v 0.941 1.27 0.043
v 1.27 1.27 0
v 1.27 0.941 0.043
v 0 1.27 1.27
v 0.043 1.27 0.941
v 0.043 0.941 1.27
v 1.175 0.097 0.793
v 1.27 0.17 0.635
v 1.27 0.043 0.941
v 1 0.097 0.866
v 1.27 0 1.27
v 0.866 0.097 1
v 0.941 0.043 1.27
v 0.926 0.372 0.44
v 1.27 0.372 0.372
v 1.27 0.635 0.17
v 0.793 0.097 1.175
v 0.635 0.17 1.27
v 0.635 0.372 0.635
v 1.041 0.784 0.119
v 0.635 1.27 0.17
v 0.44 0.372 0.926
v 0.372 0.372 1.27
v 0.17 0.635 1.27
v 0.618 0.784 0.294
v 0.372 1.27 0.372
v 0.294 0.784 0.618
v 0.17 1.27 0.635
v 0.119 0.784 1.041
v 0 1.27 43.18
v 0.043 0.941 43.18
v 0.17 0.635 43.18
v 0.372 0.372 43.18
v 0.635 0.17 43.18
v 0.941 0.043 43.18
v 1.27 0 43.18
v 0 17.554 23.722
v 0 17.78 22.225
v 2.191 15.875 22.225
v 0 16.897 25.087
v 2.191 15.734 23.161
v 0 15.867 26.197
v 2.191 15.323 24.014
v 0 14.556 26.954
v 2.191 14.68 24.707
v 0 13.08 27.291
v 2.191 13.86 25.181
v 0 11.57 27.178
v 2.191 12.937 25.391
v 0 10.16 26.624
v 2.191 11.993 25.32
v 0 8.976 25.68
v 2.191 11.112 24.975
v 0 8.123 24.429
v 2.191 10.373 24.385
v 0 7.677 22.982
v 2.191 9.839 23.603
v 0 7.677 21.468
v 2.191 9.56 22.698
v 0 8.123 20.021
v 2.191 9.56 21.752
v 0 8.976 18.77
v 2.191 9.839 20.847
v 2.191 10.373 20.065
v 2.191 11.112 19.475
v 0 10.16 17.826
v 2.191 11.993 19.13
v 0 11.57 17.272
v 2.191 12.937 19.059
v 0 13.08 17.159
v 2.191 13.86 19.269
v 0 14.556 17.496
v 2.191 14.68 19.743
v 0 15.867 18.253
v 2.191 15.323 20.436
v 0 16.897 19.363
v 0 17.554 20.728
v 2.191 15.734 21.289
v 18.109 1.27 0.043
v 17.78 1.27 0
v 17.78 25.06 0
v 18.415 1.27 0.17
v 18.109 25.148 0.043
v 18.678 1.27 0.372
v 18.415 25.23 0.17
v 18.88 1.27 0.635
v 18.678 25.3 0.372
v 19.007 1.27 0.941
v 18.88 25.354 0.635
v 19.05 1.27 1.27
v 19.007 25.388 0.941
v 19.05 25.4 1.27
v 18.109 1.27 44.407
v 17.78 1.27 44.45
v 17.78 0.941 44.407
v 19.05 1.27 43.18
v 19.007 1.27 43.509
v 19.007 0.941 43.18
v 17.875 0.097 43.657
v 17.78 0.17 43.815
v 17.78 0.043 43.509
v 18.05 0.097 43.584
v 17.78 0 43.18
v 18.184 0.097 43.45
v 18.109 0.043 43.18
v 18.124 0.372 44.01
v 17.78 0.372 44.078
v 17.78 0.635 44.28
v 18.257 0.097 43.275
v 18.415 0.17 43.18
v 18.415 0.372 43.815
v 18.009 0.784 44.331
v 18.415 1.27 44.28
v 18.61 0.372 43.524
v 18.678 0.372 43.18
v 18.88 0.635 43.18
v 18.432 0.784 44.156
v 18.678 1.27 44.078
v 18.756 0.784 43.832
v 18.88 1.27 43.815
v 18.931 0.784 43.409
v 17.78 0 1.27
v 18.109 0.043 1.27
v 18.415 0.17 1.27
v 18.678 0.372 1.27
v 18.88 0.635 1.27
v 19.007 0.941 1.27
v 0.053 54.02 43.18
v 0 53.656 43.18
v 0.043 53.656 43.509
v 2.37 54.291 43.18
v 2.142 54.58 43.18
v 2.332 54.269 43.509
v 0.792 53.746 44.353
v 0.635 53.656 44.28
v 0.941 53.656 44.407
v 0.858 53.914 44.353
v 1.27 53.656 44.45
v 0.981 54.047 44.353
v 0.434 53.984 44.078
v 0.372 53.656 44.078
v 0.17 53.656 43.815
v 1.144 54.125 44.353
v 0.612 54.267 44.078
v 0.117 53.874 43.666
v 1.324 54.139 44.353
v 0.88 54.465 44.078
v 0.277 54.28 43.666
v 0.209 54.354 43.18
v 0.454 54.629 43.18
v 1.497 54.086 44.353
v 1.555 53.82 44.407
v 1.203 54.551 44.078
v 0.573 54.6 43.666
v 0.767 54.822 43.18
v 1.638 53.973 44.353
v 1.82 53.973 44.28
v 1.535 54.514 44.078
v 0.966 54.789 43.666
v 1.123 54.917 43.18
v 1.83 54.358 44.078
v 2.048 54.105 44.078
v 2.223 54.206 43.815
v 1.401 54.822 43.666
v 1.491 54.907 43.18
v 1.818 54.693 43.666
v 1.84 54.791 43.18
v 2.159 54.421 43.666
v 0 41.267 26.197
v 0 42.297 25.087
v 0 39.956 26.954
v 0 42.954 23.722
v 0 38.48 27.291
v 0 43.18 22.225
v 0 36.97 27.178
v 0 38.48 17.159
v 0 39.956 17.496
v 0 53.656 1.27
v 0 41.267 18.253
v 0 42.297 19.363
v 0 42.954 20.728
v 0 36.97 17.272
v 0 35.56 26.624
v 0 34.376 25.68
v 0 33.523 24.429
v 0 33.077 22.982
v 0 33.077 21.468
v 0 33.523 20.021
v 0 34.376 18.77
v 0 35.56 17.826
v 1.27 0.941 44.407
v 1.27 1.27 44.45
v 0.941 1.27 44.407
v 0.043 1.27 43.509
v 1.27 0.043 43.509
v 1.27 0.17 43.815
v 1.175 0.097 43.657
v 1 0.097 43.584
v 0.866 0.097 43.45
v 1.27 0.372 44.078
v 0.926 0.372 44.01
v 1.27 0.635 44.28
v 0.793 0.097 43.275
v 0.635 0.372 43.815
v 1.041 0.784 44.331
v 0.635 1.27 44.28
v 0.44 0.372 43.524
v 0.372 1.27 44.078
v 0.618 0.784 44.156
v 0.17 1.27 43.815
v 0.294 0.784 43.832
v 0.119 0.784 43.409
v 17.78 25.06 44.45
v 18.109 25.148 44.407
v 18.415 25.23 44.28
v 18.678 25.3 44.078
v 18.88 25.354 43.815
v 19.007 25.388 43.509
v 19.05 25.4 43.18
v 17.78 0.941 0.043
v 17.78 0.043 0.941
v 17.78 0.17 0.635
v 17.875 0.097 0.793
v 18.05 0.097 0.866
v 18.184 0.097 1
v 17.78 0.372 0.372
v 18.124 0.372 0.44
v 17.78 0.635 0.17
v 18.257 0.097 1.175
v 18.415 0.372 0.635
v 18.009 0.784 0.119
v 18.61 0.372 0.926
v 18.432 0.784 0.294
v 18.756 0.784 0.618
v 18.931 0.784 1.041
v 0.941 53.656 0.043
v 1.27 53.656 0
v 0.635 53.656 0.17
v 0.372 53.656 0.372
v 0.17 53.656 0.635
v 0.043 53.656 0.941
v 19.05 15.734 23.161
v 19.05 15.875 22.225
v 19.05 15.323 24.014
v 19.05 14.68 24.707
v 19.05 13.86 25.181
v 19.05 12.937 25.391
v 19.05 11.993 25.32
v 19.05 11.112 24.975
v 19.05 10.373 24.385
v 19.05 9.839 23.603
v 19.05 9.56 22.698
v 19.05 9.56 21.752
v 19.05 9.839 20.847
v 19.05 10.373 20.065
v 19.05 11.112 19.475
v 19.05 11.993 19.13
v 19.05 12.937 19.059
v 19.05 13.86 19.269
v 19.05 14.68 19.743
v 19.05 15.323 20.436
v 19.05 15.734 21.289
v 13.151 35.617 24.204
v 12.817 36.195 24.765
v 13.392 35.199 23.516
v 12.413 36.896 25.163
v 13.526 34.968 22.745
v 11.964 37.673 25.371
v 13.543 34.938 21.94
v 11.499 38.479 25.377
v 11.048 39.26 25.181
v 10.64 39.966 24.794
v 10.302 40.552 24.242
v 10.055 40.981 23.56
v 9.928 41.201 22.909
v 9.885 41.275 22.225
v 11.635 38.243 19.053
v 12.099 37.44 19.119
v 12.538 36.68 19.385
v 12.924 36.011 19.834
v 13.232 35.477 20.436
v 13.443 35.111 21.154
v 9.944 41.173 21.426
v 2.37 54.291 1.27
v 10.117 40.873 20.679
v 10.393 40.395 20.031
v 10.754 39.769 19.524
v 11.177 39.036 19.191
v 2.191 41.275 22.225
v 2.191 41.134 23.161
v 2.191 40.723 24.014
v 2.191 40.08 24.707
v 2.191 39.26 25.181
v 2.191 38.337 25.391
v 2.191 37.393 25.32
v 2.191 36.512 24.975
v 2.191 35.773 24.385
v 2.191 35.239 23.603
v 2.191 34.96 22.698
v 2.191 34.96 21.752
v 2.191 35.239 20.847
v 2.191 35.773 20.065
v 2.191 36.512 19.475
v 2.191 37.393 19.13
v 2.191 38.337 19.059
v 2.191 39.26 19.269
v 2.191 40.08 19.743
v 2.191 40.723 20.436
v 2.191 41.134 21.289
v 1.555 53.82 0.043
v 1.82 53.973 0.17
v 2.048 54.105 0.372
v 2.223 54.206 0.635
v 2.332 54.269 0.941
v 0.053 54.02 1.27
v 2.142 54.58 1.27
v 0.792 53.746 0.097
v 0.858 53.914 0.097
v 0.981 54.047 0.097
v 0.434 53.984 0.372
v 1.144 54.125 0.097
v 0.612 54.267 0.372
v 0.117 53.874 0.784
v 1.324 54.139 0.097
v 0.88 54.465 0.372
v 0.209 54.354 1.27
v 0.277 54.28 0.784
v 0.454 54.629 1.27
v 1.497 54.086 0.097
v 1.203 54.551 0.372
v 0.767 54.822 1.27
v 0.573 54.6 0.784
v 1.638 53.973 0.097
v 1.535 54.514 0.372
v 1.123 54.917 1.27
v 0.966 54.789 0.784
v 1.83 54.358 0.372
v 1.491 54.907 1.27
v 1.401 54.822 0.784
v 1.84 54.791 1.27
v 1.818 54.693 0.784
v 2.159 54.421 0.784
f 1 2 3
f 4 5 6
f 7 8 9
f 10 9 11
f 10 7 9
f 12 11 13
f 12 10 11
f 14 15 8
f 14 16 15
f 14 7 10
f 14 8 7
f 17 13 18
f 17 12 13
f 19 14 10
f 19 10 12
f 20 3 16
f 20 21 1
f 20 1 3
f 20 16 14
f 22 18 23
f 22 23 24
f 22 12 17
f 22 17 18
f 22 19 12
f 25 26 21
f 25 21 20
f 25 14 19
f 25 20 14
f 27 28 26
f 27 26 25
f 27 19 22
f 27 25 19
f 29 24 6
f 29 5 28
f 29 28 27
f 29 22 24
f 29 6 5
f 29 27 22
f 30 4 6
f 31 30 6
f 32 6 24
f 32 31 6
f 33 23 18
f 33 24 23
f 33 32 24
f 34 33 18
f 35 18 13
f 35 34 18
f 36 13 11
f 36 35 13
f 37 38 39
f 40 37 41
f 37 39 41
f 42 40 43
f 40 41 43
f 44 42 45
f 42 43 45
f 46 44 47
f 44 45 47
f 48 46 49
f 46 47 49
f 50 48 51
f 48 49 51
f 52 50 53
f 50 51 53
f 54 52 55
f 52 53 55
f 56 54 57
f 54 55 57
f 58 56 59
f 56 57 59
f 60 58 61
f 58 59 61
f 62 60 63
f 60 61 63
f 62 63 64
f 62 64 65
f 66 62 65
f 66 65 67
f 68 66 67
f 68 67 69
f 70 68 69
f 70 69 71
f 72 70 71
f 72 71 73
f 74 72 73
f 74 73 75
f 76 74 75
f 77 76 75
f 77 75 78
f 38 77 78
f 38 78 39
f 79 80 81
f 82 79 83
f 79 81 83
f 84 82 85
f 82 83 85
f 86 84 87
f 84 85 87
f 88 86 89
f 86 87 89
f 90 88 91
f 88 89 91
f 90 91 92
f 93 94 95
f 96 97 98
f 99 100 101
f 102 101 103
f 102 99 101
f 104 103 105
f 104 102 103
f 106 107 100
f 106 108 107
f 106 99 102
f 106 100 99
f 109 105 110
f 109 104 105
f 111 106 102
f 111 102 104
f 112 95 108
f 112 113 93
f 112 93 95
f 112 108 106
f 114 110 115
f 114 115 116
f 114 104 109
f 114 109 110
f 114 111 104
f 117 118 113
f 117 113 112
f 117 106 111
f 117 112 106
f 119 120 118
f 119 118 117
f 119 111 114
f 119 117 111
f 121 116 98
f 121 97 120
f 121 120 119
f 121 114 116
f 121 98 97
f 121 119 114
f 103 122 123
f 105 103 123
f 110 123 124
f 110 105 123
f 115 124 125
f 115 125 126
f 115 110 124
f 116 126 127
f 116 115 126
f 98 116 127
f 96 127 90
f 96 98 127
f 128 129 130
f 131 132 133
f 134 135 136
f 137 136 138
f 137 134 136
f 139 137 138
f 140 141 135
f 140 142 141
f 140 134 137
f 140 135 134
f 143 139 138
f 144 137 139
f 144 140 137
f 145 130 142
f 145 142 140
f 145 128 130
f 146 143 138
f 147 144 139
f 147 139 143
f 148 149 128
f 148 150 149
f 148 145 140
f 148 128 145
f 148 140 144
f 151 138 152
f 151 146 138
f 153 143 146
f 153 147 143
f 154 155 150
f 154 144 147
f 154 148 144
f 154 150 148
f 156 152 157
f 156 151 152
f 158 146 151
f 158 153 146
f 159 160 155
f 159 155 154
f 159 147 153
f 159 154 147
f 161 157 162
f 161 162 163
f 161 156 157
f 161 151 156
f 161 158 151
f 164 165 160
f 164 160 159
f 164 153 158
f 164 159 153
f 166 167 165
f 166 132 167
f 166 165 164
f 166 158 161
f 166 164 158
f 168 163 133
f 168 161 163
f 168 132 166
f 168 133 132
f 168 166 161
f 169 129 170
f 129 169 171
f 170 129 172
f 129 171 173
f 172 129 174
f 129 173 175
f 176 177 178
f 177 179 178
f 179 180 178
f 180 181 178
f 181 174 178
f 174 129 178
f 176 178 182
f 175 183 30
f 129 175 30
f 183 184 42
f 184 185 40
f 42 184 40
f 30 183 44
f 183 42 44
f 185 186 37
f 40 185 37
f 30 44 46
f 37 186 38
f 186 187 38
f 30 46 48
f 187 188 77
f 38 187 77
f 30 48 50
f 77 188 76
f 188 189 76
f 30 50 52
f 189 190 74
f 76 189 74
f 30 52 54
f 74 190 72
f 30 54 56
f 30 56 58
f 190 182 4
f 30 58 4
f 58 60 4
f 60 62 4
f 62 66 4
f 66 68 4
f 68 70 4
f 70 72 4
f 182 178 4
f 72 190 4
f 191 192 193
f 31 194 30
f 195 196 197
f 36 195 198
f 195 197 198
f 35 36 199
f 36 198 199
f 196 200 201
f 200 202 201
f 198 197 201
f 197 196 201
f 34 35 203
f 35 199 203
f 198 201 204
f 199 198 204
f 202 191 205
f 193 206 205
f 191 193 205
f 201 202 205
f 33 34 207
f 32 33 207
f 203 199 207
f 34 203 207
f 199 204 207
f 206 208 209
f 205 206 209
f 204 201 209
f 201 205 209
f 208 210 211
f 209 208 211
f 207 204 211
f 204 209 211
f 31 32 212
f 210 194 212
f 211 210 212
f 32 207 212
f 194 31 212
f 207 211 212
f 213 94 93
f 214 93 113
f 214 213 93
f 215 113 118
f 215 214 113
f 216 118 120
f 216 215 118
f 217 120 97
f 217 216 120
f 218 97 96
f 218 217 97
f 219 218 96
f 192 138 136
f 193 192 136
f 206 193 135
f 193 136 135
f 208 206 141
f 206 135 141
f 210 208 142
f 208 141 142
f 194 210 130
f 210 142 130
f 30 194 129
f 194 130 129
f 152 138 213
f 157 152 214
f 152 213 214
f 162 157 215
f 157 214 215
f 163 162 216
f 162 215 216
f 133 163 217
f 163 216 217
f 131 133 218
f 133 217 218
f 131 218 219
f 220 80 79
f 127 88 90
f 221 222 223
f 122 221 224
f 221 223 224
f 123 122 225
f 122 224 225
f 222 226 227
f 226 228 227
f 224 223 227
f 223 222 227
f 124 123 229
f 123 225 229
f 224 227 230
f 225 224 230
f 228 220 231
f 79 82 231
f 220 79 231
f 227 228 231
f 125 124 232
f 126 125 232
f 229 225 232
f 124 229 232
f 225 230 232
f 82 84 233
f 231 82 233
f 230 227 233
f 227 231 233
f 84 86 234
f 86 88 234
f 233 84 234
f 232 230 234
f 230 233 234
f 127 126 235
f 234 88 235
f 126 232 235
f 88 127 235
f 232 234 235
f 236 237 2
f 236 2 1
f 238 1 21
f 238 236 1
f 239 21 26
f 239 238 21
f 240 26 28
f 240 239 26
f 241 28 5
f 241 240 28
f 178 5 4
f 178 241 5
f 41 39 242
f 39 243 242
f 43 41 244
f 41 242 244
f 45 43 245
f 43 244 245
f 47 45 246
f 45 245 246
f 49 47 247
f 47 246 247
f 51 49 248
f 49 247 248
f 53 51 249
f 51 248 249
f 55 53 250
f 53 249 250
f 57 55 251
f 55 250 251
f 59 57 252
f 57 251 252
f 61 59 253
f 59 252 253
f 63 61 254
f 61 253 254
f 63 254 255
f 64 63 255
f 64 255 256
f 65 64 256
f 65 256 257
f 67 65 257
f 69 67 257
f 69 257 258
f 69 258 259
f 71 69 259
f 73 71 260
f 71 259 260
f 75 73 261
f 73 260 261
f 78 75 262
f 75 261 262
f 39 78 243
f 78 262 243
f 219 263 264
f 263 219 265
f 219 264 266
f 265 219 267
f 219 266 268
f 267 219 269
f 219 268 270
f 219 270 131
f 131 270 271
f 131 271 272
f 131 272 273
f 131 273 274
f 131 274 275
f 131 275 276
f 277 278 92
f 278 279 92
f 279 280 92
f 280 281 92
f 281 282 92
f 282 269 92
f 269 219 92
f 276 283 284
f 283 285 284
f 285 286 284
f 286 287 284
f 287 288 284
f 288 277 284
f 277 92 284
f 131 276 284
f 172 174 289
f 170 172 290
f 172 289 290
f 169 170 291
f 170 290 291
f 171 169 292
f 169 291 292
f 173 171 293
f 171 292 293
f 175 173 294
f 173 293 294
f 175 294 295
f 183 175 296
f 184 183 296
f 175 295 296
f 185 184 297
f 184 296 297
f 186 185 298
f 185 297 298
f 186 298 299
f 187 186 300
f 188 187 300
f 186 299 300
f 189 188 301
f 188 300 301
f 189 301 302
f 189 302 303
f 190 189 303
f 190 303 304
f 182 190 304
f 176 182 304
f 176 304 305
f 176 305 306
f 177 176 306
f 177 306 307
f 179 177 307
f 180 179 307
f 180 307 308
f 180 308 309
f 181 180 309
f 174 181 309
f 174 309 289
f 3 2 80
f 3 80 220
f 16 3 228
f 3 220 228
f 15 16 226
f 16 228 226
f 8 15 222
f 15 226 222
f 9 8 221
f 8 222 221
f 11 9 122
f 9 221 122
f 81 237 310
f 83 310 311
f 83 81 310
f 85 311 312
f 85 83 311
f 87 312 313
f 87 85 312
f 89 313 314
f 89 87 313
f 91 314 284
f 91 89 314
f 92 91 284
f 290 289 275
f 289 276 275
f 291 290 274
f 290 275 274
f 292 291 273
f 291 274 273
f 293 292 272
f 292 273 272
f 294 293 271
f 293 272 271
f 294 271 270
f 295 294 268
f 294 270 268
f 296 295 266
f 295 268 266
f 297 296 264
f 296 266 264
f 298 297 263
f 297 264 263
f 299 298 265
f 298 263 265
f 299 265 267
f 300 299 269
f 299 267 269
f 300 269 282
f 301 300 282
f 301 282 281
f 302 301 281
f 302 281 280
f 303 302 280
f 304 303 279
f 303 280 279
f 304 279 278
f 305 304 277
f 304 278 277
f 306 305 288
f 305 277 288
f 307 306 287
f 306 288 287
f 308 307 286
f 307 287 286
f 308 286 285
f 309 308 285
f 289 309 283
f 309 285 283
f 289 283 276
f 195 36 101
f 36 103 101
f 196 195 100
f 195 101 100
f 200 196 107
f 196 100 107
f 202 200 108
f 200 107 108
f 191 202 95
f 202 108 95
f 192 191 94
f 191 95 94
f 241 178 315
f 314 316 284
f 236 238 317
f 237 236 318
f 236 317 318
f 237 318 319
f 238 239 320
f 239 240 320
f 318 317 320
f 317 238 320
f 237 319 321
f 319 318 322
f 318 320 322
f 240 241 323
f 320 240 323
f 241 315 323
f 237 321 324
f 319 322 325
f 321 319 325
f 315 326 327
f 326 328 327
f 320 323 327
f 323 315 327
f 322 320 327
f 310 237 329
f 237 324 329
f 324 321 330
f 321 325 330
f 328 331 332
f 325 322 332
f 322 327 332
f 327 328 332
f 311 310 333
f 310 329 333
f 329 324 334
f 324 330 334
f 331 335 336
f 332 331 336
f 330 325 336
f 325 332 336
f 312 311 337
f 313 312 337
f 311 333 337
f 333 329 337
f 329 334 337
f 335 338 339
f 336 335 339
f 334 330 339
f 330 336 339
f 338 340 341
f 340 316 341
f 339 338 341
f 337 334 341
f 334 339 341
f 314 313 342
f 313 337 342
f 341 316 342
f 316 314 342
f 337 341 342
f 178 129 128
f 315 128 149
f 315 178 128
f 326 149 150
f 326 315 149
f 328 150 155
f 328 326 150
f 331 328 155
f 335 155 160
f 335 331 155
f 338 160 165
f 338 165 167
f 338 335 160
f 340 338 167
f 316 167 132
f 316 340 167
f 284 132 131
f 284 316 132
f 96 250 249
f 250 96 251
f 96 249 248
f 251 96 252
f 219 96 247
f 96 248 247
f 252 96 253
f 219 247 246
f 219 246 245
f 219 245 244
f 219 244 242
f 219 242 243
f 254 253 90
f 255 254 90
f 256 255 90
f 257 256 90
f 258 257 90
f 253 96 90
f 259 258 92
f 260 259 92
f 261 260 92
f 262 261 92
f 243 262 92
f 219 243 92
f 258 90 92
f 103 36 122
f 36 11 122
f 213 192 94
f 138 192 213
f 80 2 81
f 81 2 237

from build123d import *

# Parameters (mm, degrees)
F1_DEPTH       = 44.45
F3_D           = 6.35
F3_CSINK_D     = 10.16
F3_CSINK_ANGLE = 82
F4_T1_DEPTH    = 68.1485226281
F5_R           = 1.27


# Not quite as in the source:
# - a fillet or chamfer that OpenCascade refuses, or shapes differently, is made with other operations: its cross-section is extruded or revolved along the edge and cut away or added
# - a feature names something its author has since deleted; it is built from what else it names


with BuildPart() as f1:
    # F0 (on Top) → F1 (new body)
    with BuildSketch(Plane.XY):
        Polygon((0, 58.3955678842), (0, 0), (19.05, 0), (19.05, 25.4), align=None)
    extrude(amount=F1_DEPTH)

    # F3 (through all)
    with Locations(Plane(origin=(0, 0, 0), x_dir=(0, -1, 0), z_dir=(-1, 0, 0))):
        with Locations((-12.7, 22.225), (-38.1, 22.225)):
            CounterSinkHole(F3_D / 2, F3_CSINK_D / 2, counter_sink_angle=F3_CSINK_ANGLE)

    # F4: fillet of radius 1.27 on 1 edges, made by hand

    # F4_s2 → F4_t1 (cut)
    with BuildSketch(Plane.XY.offset(-11.849261314)):
        with BuildLine():
            ThreePointArc((0, 53.6558633586), (0.9412998127, 54.882589158), (2.3698522628, 54.2908633586))
            Line((2.3698522628, 54.2908633586), (0, 58.3955678842))
            Line((0, 58.3955678842), (0, 53.6558633586))
        make_face()
    extrude(amount=F4_T1_DEPTH, mode=Mode.SUBTRACT)

    # F5
    f5_edges = [f1.edges().sort_by_distance(p)[0] for p in [
        (0.9413, 54.882589, 44.45),
        (10.709926, 39.845432, 44.45),
        (19.05, 12.7, 44.45),
        (9.525, 0, 44.45),
        (0, 26.827932, 44.45),
        (0.9413, 54.882589, 0),
        (10.709926, 39.845432, 0),
        (19.05, 12.7, 0),
        (9.525, 0, 0),
        (0, 26.827932, 0),
        (0, 0, 22.225),
        (19.05, 0, 22.225),
    ]]
    fillet(f5_edges, radius=F5_R)


solid = f1.part
